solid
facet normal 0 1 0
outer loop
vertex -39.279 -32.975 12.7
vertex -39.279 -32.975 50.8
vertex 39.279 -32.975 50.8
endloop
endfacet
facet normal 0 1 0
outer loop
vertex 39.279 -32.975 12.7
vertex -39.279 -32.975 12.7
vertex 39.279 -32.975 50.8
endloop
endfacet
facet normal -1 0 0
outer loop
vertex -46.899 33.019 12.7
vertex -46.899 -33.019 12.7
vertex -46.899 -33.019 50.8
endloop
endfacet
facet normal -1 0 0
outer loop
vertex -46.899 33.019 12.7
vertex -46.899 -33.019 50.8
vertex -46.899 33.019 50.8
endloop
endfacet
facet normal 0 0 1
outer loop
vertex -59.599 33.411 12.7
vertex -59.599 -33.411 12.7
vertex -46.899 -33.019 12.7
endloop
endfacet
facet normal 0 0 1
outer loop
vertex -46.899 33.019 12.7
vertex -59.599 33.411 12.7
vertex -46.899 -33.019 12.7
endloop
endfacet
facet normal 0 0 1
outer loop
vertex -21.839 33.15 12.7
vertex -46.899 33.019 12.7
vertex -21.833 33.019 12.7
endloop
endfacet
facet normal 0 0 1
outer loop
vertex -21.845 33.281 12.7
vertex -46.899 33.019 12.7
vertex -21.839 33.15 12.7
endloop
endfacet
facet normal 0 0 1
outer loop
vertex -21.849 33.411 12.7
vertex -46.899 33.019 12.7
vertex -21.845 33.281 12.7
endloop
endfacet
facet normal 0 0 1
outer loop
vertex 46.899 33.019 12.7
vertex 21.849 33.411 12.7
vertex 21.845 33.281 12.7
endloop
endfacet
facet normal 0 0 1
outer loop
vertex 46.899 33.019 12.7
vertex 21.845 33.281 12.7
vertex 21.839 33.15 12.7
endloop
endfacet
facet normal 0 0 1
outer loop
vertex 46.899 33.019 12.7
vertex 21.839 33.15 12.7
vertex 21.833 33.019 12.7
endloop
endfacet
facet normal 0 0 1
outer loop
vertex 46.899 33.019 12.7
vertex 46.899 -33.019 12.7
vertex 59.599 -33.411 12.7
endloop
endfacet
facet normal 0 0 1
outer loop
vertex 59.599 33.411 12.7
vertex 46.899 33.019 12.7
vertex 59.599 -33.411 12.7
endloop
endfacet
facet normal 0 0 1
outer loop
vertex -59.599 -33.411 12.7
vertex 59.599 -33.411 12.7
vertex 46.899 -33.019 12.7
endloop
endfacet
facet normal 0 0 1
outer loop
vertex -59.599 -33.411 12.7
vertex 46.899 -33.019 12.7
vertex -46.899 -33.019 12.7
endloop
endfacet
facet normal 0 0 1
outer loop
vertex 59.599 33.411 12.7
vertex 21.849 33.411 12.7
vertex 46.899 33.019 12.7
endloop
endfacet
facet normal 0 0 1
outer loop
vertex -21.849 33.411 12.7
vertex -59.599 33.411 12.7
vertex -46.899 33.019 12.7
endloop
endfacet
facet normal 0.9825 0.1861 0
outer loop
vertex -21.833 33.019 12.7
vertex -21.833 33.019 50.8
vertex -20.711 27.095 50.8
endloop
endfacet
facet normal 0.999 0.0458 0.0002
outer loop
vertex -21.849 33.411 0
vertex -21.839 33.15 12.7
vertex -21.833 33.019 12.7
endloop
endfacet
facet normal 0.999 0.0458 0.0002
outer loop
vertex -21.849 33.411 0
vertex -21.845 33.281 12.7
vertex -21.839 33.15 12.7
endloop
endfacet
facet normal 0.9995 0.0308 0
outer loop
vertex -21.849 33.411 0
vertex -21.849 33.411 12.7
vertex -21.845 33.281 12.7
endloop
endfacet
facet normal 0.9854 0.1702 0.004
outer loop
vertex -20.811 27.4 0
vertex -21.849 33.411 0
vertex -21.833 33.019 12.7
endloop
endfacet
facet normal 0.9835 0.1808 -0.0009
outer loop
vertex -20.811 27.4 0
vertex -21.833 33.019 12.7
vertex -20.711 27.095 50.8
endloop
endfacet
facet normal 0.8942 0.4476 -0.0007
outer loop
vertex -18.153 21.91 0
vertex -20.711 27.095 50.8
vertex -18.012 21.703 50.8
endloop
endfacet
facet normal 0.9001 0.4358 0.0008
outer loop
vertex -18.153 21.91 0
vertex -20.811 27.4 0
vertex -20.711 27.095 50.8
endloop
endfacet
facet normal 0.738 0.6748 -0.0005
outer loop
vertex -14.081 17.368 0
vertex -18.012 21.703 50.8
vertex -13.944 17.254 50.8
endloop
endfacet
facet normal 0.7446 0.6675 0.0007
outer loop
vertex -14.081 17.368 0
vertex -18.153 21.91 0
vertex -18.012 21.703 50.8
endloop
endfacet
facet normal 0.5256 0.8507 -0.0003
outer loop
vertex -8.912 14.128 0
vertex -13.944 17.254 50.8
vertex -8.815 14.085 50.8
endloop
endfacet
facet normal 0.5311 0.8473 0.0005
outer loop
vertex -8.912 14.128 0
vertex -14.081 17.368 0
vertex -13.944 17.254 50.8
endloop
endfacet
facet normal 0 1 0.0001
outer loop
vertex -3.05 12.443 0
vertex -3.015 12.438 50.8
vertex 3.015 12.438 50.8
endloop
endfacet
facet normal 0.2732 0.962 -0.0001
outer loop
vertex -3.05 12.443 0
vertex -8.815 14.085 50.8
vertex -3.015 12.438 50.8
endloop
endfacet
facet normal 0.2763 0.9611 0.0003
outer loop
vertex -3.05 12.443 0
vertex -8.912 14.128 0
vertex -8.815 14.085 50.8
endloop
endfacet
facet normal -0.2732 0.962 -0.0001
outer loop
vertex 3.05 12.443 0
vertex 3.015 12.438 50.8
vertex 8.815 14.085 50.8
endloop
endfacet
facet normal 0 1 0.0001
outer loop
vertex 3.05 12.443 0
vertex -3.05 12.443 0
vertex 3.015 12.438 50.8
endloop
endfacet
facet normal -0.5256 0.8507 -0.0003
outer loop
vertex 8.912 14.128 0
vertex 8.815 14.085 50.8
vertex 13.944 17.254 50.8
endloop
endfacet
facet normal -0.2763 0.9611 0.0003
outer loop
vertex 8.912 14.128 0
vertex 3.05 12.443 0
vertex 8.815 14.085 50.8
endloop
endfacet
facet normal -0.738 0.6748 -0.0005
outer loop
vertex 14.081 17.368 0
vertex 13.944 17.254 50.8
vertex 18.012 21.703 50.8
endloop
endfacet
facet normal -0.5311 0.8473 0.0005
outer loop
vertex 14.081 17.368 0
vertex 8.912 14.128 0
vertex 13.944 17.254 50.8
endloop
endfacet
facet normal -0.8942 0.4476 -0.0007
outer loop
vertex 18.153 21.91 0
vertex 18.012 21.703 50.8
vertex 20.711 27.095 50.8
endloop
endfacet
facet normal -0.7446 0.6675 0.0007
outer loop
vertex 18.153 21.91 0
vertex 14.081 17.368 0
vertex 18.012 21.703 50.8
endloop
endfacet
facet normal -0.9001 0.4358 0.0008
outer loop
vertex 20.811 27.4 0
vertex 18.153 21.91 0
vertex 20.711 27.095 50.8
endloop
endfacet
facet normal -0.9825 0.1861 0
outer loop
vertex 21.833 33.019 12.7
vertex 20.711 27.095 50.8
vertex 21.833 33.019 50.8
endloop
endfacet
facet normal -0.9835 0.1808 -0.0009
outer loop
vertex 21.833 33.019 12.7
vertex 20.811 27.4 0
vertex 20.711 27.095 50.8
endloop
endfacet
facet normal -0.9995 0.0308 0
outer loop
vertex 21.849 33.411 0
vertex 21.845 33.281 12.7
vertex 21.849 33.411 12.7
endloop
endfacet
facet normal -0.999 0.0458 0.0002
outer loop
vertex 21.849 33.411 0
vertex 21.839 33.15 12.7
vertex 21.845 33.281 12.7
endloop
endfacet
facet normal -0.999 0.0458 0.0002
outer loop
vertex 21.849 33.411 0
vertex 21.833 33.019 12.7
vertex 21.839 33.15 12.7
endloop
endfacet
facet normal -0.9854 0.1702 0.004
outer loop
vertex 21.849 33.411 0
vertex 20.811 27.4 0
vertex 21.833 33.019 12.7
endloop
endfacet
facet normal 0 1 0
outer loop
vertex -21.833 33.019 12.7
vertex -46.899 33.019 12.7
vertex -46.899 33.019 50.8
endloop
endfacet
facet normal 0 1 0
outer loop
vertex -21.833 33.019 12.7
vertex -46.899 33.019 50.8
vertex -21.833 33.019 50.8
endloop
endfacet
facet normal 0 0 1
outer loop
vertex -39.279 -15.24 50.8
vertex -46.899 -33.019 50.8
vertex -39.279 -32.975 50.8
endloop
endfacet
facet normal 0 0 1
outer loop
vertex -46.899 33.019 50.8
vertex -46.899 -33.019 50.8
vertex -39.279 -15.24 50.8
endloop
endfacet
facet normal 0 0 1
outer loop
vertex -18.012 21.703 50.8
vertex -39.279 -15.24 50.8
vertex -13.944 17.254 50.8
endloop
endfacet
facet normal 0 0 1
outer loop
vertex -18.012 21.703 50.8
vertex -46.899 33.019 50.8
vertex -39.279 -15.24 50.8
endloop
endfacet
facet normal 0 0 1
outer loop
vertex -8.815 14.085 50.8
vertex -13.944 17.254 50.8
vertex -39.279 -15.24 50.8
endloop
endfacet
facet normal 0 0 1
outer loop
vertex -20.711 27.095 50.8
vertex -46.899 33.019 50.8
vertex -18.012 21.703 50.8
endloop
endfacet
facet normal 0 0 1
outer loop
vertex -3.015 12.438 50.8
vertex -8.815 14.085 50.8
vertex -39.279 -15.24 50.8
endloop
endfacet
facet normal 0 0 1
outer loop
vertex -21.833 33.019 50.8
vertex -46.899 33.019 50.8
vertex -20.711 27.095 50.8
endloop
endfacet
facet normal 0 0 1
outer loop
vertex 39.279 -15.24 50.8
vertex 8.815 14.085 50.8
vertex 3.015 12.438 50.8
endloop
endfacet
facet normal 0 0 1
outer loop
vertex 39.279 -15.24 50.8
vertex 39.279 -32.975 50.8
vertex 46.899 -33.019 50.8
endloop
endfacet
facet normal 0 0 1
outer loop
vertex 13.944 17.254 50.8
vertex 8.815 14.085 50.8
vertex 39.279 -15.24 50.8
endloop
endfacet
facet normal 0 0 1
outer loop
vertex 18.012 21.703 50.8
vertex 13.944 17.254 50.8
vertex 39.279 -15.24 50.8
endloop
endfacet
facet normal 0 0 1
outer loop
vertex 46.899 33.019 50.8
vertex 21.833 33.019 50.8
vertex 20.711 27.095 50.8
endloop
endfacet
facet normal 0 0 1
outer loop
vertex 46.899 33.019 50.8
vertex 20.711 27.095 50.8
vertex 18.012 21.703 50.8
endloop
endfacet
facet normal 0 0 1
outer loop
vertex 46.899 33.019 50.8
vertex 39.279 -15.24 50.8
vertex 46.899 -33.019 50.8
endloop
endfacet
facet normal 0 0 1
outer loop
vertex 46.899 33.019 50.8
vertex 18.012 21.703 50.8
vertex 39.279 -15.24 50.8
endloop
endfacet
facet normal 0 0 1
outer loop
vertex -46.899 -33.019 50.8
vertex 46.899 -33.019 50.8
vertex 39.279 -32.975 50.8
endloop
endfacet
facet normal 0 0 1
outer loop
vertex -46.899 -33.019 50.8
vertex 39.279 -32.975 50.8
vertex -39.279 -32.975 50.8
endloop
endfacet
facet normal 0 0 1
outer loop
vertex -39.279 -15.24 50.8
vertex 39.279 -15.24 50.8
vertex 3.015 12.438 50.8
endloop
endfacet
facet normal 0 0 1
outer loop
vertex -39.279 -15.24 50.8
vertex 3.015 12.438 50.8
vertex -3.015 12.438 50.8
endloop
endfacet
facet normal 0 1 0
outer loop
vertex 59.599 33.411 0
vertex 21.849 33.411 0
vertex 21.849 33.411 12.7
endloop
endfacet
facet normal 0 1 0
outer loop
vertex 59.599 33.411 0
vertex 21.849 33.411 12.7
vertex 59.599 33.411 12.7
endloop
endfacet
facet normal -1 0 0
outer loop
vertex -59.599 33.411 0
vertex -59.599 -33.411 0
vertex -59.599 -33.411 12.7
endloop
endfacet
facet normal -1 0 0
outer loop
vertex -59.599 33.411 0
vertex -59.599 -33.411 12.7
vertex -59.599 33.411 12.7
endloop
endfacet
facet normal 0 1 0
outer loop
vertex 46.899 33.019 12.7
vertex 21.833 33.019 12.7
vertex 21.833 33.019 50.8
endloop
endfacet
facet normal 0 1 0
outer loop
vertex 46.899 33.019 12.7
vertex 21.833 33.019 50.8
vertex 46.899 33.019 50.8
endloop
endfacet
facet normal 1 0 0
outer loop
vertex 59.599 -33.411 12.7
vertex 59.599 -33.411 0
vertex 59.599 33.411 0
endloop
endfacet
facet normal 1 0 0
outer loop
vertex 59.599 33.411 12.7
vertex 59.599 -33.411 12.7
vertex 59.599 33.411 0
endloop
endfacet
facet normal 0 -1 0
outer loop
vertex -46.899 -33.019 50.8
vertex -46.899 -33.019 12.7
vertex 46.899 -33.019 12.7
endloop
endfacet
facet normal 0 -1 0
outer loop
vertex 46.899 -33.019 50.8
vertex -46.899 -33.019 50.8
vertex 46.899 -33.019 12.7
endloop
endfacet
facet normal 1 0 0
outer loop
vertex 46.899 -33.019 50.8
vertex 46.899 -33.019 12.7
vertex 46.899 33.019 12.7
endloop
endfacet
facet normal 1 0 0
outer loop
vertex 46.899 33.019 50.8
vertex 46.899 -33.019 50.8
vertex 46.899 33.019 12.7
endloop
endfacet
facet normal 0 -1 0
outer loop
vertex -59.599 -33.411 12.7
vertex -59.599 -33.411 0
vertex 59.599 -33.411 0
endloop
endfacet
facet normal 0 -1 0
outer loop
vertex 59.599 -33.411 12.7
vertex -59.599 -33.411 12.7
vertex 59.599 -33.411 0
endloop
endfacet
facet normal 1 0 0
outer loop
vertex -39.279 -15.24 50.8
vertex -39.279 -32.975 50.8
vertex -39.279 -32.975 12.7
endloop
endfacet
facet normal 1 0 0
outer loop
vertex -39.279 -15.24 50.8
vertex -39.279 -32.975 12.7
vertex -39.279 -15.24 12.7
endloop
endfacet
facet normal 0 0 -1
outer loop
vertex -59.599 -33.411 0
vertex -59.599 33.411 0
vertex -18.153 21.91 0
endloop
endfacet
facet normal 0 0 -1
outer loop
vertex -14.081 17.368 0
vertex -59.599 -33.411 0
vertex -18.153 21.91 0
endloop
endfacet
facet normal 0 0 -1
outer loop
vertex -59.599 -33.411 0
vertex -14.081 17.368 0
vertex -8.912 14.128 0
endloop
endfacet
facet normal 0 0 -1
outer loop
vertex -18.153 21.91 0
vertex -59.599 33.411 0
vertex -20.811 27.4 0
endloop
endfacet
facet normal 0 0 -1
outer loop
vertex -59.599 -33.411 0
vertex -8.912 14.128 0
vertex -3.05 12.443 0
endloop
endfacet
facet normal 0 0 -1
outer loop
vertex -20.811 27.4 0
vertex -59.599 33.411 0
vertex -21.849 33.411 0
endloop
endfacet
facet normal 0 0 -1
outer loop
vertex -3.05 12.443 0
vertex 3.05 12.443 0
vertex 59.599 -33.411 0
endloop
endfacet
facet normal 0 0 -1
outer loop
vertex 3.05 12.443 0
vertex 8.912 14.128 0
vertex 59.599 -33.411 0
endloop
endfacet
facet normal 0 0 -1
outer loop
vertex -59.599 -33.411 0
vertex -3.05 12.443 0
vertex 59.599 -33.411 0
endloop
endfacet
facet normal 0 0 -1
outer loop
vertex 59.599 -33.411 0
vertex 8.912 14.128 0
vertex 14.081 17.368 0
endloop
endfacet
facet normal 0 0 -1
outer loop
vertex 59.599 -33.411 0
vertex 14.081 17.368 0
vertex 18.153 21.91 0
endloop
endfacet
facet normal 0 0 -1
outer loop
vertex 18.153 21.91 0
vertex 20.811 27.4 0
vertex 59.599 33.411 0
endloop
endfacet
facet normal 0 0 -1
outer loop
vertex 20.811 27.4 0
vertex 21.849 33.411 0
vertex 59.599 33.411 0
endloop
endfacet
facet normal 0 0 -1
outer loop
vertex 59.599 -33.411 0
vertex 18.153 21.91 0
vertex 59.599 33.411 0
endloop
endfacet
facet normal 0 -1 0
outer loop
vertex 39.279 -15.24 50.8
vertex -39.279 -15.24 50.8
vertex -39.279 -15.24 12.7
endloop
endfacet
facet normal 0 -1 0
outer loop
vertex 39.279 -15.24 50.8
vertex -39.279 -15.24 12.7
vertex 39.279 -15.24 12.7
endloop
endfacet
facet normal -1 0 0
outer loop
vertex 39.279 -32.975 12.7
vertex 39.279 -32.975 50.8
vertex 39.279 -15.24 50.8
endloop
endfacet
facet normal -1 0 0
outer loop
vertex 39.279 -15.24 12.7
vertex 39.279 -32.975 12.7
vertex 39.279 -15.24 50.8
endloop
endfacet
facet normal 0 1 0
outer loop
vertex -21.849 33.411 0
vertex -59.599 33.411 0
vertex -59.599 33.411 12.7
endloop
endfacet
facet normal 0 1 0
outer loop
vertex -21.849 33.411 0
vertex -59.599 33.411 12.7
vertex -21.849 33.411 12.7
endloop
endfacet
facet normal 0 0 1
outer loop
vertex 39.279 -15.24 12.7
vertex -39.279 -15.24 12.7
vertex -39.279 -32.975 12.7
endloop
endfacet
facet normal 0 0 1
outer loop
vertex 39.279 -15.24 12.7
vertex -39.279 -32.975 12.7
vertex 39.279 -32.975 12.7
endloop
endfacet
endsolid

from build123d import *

# Parameters (mm, degrees)
F0_W     = 119.197724
F0_H     = 66.822962
F1_DEPTH = 12.7
F2_W     = 93.797724
F2_H     = 66.037954
F3_DEPTH = 50.8
F4_R     = 21.859631
F5_DEPTH = 123.444
F6_W     = 78.557724
F6_H     = 17.734622
F7_DEPTH = 38.1


with BuildPart() as f1:
    # F0 (on Top) → F1 (new body)
    with BuildSketch(Plane.XY):
        Rectangle(F0_W, F0_H)
    extrude(amount=F1_DEPTH)

    # F2 (on Top) → F3 (join)
    with BuildSketch(Plane.XY):
        Rectangle(F2_W, F2_H)
    extrude(amount=F3_DEPTH)

    # F4 (on Top) → F5 (cut)
    with BuildSketch(Plane.XY):
        with Locations((0, 34.088746)):
            Circle(F4_R)
    extrude(amount=F5_DEPTH, mode=Mode.SUBTRACT)

    # F6 (on face) → F7 (cut)
    with BuildSketch(Plane.XY.offset(50.8)):
        with Locations((0, -24.107311)):
            Rectangle(F6_W, F6_H)
    extrude(amount=-F7_DEPTH, mode=Mode.SUBTRACT)


solid = f1.part
